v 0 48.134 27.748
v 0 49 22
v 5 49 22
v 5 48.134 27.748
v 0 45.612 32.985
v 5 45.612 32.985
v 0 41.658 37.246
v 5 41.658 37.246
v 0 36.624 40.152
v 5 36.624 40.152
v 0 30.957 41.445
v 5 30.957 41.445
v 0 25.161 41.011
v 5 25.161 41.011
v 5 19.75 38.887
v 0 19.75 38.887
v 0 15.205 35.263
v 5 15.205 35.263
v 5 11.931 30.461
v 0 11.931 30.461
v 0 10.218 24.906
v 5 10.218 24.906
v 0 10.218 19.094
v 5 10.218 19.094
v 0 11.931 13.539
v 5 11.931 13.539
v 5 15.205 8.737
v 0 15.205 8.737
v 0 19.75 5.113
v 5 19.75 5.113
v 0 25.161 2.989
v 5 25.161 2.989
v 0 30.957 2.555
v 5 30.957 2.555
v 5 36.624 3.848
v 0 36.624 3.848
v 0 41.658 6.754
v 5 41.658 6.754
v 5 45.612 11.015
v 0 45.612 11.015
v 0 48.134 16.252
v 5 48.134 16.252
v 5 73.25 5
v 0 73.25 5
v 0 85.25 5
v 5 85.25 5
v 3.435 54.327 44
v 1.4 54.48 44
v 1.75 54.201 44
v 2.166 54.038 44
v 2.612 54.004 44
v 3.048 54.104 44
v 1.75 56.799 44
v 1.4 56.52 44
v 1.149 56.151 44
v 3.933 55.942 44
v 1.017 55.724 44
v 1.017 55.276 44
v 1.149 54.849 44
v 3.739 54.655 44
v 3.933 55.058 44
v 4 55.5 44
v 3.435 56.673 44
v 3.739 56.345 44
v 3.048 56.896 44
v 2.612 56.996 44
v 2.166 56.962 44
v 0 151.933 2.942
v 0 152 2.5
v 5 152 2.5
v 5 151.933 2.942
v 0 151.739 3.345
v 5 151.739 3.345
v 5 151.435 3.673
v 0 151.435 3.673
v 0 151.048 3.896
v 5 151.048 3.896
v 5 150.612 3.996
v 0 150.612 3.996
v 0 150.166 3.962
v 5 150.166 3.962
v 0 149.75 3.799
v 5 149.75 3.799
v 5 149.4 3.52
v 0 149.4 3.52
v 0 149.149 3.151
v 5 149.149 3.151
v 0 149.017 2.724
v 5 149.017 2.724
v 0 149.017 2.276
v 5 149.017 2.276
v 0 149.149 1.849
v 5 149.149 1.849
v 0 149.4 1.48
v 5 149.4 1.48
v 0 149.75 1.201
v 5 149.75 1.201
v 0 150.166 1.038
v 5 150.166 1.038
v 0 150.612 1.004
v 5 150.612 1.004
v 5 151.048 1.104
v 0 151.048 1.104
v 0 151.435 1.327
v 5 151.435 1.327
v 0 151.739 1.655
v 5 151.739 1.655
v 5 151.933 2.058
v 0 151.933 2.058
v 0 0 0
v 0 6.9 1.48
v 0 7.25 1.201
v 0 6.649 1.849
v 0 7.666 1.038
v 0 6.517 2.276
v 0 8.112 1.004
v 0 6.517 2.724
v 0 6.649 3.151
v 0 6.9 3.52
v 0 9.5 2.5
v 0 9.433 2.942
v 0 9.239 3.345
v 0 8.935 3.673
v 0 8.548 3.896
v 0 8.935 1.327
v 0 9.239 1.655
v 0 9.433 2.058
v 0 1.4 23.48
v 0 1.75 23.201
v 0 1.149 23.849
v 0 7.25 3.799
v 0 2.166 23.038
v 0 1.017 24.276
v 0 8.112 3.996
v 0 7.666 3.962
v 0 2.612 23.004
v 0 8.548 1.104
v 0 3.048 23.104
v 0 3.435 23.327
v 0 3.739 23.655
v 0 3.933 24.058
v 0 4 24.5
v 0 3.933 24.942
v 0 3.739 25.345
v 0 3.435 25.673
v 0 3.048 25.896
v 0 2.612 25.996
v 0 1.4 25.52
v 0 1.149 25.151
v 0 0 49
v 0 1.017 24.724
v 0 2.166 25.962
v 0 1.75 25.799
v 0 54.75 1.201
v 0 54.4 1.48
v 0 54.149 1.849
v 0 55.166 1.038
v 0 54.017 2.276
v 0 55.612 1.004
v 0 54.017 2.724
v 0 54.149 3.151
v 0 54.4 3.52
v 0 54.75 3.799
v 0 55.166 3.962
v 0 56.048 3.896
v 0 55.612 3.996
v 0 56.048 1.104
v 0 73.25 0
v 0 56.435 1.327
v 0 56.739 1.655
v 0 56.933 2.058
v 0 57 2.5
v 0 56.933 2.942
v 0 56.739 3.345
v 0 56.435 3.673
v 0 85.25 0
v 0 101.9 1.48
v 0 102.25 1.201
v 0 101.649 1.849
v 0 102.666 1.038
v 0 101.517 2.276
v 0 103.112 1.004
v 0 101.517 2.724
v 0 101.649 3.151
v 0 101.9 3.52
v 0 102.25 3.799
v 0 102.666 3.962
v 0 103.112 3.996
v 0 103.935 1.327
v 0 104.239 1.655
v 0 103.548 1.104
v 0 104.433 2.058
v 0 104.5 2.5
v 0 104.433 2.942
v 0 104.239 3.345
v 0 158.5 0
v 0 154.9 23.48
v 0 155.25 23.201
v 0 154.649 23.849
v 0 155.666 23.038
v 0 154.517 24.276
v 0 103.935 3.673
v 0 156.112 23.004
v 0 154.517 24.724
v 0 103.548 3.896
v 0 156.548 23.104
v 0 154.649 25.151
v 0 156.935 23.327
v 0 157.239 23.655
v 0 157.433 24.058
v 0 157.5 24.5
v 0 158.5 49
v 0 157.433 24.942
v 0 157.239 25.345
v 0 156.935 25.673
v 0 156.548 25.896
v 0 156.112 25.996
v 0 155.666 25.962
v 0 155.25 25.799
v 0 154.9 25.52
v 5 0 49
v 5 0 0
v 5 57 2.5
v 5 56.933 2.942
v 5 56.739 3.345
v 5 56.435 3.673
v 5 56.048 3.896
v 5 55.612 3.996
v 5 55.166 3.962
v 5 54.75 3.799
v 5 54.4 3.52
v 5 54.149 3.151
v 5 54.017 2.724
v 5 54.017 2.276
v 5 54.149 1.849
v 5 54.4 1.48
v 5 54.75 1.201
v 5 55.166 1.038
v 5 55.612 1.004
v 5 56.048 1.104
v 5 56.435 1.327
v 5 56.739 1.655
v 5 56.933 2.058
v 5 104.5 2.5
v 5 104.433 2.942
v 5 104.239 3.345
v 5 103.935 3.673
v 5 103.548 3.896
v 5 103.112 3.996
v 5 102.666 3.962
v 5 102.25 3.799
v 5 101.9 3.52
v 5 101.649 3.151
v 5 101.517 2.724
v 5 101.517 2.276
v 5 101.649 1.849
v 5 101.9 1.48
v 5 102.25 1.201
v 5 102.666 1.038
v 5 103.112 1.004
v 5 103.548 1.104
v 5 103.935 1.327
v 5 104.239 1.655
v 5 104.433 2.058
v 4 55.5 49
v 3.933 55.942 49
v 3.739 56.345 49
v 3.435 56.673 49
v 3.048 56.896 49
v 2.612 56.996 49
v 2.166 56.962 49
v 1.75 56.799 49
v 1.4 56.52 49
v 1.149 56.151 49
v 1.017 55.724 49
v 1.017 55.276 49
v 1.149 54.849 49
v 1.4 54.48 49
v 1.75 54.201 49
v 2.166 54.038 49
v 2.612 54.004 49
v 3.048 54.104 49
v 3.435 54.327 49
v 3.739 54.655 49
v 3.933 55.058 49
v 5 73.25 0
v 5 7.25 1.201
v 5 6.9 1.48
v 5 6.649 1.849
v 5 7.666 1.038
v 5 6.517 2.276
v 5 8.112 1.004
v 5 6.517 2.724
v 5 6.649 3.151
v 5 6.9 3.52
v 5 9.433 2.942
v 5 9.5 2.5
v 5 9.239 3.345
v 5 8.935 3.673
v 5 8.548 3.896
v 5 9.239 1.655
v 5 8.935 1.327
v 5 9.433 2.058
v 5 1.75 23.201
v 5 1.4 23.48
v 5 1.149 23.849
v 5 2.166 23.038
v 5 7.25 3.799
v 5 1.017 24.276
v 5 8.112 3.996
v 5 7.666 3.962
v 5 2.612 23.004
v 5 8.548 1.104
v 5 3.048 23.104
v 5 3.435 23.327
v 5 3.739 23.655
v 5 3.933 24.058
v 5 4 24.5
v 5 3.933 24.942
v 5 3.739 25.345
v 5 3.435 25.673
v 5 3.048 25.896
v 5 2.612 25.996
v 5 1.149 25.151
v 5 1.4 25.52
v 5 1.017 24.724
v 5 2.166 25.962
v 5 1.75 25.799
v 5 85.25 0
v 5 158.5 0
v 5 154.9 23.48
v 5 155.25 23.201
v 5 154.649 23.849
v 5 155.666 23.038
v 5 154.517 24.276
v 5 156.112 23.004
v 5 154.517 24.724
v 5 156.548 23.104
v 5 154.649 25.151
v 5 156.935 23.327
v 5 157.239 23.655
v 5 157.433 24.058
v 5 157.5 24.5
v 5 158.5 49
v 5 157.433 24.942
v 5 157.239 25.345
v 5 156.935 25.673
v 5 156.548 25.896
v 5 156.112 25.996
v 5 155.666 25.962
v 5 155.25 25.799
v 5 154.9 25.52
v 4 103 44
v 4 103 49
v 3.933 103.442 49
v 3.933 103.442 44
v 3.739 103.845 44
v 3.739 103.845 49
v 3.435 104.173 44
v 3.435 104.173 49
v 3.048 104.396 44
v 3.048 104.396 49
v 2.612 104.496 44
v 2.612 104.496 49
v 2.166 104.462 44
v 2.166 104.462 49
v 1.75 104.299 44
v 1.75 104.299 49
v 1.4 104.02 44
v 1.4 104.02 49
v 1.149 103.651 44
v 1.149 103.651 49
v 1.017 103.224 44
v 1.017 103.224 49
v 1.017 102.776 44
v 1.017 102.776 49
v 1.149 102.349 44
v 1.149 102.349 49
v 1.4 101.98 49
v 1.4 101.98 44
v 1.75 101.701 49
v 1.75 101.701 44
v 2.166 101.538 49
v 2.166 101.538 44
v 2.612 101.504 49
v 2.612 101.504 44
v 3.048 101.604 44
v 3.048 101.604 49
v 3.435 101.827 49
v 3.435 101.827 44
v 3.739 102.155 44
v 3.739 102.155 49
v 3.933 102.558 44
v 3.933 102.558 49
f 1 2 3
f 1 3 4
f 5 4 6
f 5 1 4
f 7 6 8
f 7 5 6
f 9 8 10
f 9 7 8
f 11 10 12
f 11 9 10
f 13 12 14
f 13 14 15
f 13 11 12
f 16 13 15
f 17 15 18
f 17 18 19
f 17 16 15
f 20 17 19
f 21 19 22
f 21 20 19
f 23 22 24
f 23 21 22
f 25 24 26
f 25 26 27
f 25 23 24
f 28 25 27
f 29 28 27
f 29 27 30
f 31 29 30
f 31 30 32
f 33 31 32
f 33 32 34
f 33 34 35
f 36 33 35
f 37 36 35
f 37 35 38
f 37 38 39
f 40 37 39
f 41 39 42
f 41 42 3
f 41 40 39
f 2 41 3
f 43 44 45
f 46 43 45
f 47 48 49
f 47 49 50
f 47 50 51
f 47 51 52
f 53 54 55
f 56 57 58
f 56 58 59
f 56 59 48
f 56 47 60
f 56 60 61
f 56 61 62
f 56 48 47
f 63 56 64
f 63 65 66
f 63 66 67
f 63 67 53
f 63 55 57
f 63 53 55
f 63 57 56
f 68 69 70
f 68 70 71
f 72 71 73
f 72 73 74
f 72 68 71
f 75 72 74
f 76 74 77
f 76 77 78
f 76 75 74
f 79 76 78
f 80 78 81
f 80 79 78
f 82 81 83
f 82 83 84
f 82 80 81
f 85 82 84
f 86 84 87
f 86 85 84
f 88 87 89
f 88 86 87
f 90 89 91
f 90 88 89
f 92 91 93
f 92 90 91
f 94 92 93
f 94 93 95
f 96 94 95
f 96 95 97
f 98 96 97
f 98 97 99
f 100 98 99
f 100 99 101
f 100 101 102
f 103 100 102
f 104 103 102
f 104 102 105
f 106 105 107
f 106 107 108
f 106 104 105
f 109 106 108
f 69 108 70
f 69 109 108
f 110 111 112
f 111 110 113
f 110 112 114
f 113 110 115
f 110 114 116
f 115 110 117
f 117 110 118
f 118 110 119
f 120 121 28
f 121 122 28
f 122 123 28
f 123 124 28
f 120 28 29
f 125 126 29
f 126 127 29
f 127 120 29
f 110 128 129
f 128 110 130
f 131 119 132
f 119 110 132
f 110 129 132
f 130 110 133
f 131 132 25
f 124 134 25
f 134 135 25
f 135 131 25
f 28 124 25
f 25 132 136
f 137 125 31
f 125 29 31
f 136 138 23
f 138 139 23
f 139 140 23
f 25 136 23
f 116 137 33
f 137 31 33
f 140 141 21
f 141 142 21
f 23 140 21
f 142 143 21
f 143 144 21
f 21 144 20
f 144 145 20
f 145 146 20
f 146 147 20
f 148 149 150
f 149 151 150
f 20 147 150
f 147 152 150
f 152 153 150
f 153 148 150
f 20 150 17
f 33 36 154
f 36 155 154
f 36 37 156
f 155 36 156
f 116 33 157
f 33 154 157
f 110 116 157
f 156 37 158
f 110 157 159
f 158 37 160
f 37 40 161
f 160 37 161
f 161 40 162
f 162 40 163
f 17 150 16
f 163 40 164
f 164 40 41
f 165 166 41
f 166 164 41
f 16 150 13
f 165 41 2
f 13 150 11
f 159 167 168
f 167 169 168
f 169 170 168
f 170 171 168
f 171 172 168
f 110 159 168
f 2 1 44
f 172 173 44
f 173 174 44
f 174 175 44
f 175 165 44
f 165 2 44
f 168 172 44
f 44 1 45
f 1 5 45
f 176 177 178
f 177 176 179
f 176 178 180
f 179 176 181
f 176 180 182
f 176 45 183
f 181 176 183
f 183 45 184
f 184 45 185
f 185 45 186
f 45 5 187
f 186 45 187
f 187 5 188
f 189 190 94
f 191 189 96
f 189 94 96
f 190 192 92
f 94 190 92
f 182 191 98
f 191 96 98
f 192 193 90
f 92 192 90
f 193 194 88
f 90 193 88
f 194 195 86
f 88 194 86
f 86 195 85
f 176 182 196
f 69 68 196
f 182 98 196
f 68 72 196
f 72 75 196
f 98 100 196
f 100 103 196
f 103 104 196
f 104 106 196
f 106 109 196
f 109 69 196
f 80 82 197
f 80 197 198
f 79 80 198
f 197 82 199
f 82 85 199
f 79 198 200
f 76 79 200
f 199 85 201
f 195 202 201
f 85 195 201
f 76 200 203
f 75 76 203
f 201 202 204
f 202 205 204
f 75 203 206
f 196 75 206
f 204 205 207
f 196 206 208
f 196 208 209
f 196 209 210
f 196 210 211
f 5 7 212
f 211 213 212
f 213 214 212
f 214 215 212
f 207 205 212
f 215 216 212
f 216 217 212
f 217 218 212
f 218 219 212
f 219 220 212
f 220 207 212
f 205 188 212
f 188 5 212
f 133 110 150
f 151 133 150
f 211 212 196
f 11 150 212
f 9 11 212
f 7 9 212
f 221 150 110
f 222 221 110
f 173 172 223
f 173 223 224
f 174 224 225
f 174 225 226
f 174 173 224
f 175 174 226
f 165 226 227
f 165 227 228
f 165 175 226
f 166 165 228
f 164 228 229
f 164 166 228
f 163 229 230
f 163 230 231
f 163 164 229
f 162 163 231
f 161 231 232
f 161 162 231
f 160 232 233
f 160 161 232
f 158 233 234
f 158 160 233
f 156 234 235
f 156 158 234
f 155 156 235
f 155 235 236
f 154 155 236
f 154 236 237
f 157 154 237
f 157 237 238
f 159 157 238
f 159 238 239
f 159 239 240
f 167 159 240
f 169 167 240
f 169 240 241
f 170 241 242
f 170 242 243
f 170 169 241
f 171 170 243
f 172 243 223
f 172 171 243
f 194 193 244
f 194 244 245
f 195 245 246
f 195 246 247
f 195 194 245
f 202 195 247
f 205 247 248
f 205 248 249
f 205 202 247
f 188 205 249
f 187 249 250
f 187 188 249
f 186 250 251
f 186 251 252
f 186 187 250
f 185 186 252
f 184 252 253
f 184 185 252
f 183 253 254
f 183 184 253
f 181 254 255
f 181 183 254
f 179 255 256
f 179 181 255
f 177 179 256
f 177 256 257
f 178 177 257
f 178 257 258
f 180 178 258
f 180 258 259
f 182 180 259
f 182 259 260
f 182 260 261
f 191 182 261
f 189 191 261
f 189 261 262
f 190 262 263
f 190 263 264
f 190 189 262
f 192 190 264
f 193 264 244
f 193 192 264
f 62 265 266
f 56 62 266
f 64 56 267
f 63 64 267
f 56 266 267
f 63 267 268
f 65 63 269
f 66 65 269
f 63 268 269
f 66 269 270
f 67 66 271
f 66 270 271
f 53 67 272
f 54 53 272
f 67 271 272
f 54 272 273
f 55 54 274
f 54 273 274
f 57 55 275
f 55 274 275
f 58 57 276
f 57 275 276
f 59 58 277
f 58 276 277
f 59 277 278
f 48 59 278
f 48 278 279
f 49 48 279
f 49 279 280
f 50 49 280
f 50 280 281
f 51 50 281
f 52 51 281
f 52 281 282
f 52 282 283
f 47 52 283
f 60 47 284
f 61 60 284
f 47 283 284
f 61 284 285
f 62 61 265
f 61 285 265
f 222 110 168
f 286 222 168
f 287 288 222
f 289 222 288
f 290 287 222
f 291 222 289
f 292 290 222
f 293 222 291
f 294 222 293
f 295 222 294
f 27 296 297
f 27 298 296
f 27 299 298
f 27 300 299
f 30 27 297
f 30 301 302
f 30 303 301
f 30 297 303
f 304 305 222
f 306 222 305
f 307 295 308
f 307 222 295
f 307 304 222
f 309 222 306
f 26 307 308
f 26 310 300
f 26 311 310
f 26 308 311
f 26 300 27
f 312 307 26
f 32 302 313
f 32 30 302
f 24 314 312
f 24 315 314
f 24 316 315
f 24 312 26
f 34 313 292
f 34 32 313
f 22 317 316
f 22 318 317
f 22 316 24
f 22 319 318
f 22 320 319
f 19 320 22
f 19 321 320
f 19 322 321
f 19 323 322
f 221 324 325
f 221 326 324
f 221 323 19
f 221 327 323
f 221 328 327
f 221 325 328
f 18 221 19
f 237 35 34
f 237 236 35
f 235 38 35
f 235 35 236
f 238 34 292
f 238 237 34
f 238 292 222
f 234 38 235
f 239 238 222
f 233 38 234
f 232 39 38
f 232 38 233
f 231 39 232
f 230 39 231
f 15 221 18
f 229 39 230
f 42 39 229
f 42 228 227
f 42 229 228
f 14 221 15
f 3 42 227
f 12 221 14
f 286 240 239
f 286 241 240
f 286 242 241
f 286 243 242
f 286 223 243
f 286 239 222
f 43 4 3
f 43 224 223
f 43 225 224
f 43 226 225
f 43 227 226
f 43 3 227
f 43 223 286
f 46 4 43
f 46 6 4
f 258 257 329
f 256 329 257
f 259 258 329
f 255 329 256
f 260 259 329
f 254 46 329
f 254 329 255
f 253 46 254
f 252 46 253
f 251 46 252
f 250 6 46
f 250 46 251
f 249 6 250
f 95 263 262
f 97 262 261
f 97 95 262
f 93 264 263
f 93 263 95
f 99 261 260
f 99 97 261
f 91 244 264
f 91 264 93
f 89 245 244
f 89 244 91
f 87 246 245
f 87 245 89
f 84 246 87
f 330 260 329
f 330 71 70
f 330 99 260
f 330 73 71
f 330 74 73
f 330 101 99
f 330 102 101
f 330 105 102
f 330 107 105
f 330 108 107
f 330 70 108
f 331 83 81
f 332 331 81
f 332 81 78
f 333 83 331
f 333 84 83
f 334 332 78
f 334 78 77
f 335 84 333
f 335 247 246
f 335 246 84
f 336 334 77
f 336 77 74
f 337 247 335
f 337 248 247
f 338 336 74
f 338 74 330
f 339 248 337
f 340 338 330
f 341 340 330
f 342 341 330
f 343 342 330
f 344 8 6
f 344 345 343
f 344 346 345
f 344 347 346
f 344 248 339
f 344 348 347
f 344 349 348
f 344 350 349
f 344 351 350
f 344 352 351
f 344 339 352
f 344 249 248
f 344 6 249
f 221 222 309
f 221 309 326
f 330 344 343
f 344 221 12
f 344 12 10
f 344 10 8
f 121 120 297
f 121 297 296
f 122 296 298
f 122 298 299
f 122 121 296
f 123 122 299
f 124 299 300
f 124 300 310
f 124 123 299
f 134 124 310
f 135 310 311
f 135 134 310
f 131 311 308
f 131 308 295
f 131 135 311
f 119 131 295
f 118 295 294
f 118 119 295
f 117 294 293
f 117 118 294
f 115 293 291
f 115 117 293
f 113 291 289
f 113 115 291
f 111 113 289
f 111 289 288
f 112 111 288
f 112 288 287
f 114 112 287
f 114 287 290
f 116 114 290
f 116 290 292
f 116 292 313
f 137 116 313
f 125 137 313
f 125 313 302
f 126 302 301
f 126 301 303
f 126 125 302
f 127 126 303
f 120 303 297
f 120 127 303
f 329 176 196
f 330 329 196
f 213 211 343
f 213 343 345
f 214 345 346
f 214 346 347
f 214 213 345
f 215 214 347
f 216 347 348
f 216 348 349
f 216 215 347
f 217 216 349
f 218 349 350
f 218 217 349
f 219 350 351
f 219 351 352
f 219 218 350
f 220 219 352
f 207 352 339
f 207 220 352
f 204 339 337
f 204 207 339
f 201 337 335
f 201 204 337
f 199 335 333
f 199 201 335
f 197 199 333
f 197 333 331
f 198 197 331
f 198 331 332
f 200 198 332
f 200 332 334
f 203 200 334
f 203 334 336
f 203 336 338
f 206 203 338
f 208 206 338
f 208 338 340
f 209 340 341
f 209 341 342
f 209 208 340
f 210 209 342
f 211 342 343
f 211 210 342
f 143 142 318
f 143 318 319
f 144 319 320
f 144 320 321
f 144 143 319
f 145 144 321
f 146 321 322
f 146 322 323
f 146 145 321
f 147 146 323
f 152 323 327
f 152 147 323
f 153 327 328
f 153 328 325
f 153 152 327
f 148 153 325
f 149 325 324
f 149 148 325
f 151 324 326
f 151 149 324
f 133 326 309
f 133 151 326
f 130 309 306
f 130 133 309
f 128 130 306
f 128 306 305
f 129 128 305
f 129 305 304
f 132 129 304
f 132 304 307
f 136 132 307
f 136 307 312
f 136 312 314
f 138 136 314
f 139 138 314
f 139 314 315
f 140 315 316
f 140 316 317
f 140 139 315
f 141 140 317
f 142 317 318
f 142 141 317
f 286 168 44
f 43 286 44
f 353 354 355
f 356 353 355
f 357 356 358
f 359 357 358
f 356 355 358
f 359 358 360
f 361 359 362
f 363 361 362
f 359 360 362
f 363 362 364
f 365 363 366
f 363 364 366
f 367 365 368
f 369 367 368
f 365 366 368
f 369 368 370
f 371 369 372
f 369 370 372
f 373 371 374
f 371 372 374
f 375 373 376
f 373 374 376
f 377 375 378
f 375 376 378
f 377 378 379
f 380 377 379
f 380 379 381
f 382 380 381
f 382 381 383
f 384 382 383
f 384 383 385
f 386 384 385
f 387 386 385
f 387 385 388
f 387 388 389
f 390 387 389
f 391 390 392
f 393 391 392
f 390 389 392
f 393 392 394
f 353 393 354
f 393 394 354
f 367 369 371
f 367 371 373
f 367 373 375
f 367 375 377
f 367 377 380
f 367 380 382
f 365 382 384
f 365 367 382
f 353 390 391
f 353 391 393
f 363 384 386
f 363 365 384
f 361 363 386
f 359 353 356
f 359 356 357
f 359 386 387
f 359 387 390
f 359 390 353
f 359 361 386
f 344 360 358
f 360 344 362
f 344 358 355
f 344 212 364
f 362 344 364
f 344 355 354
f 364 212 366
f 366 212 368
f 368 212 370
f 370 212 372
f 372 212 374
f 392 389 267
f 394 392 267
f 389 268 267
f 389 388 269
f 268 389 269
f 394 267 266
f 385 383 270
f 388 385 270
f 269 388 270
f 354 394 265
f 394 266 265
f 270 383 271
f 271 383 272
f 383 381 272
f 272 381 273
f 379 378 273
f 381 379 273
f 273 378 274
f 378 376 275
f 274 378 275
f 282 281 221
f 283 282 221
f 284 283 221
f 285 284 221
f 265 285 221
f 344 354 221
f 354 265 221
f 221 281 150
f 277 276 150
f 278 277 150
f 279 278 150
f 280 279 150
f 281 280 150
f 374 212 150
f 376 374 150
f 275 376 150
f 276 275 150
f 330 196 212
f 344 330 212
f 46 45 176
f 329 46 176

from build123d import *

# Parameters (mm, degrees)
F0_R     = 1.5
F0_R_2   = 19.5
F1_DEPTH = 5
F2_R     = 1.5
F3_DEPTH = 5


with BuildPart() as f1:
    # F0 (on Right) → F1 (new body)
    with BuildSketch(Plane.YZ):
        Polygon((0, 49), (0, 0), (73.25, 0), (73.25, 5), (85.25, 5), (85.25, 0), (158.5, 0), (158.5, 49), align=None)
        with Locations((8, 2.5)):
            Circle(F0_R, mode=Mode.SUBTRACT)
        with Locations((55.5, 2.5)):
            Circle(F0_R, mode=Mode.SUBTRACT)
        with Locations((2.5, 24.5)):
            Circle(F0_R, mode=Mode.SUBTRACT)
        with Locations((29.5, 22)):
            Circle(F0_R_2, mode=Mode.SUBTRACT)
        with Locations((103, 2.5)):
            Circle(F0_R, mode=Mode.SUBTRACT)
        with Locations((150.5, 2.5)):
            Circle(F0_R, mode=Mode.SUBTRACT)
        with Locations((156, 24.5)):
            Circle(F0_R, mode=Mode.SUBTRACT)
    extrude(amount=F1_DEPTH)

    # F2 (on face) → F3 (cut)
    with BuildSketch(Plane.XY.offset(49)):
        with Locations((2.5, 55.5)):
            Circle(F2_R)
        with Locations((2.5, 103)):
            Circle(F2_R)
    extrude(amount=-F3_DEPTH, mode=Mode.SUBTRACT)


solid = f1.part
